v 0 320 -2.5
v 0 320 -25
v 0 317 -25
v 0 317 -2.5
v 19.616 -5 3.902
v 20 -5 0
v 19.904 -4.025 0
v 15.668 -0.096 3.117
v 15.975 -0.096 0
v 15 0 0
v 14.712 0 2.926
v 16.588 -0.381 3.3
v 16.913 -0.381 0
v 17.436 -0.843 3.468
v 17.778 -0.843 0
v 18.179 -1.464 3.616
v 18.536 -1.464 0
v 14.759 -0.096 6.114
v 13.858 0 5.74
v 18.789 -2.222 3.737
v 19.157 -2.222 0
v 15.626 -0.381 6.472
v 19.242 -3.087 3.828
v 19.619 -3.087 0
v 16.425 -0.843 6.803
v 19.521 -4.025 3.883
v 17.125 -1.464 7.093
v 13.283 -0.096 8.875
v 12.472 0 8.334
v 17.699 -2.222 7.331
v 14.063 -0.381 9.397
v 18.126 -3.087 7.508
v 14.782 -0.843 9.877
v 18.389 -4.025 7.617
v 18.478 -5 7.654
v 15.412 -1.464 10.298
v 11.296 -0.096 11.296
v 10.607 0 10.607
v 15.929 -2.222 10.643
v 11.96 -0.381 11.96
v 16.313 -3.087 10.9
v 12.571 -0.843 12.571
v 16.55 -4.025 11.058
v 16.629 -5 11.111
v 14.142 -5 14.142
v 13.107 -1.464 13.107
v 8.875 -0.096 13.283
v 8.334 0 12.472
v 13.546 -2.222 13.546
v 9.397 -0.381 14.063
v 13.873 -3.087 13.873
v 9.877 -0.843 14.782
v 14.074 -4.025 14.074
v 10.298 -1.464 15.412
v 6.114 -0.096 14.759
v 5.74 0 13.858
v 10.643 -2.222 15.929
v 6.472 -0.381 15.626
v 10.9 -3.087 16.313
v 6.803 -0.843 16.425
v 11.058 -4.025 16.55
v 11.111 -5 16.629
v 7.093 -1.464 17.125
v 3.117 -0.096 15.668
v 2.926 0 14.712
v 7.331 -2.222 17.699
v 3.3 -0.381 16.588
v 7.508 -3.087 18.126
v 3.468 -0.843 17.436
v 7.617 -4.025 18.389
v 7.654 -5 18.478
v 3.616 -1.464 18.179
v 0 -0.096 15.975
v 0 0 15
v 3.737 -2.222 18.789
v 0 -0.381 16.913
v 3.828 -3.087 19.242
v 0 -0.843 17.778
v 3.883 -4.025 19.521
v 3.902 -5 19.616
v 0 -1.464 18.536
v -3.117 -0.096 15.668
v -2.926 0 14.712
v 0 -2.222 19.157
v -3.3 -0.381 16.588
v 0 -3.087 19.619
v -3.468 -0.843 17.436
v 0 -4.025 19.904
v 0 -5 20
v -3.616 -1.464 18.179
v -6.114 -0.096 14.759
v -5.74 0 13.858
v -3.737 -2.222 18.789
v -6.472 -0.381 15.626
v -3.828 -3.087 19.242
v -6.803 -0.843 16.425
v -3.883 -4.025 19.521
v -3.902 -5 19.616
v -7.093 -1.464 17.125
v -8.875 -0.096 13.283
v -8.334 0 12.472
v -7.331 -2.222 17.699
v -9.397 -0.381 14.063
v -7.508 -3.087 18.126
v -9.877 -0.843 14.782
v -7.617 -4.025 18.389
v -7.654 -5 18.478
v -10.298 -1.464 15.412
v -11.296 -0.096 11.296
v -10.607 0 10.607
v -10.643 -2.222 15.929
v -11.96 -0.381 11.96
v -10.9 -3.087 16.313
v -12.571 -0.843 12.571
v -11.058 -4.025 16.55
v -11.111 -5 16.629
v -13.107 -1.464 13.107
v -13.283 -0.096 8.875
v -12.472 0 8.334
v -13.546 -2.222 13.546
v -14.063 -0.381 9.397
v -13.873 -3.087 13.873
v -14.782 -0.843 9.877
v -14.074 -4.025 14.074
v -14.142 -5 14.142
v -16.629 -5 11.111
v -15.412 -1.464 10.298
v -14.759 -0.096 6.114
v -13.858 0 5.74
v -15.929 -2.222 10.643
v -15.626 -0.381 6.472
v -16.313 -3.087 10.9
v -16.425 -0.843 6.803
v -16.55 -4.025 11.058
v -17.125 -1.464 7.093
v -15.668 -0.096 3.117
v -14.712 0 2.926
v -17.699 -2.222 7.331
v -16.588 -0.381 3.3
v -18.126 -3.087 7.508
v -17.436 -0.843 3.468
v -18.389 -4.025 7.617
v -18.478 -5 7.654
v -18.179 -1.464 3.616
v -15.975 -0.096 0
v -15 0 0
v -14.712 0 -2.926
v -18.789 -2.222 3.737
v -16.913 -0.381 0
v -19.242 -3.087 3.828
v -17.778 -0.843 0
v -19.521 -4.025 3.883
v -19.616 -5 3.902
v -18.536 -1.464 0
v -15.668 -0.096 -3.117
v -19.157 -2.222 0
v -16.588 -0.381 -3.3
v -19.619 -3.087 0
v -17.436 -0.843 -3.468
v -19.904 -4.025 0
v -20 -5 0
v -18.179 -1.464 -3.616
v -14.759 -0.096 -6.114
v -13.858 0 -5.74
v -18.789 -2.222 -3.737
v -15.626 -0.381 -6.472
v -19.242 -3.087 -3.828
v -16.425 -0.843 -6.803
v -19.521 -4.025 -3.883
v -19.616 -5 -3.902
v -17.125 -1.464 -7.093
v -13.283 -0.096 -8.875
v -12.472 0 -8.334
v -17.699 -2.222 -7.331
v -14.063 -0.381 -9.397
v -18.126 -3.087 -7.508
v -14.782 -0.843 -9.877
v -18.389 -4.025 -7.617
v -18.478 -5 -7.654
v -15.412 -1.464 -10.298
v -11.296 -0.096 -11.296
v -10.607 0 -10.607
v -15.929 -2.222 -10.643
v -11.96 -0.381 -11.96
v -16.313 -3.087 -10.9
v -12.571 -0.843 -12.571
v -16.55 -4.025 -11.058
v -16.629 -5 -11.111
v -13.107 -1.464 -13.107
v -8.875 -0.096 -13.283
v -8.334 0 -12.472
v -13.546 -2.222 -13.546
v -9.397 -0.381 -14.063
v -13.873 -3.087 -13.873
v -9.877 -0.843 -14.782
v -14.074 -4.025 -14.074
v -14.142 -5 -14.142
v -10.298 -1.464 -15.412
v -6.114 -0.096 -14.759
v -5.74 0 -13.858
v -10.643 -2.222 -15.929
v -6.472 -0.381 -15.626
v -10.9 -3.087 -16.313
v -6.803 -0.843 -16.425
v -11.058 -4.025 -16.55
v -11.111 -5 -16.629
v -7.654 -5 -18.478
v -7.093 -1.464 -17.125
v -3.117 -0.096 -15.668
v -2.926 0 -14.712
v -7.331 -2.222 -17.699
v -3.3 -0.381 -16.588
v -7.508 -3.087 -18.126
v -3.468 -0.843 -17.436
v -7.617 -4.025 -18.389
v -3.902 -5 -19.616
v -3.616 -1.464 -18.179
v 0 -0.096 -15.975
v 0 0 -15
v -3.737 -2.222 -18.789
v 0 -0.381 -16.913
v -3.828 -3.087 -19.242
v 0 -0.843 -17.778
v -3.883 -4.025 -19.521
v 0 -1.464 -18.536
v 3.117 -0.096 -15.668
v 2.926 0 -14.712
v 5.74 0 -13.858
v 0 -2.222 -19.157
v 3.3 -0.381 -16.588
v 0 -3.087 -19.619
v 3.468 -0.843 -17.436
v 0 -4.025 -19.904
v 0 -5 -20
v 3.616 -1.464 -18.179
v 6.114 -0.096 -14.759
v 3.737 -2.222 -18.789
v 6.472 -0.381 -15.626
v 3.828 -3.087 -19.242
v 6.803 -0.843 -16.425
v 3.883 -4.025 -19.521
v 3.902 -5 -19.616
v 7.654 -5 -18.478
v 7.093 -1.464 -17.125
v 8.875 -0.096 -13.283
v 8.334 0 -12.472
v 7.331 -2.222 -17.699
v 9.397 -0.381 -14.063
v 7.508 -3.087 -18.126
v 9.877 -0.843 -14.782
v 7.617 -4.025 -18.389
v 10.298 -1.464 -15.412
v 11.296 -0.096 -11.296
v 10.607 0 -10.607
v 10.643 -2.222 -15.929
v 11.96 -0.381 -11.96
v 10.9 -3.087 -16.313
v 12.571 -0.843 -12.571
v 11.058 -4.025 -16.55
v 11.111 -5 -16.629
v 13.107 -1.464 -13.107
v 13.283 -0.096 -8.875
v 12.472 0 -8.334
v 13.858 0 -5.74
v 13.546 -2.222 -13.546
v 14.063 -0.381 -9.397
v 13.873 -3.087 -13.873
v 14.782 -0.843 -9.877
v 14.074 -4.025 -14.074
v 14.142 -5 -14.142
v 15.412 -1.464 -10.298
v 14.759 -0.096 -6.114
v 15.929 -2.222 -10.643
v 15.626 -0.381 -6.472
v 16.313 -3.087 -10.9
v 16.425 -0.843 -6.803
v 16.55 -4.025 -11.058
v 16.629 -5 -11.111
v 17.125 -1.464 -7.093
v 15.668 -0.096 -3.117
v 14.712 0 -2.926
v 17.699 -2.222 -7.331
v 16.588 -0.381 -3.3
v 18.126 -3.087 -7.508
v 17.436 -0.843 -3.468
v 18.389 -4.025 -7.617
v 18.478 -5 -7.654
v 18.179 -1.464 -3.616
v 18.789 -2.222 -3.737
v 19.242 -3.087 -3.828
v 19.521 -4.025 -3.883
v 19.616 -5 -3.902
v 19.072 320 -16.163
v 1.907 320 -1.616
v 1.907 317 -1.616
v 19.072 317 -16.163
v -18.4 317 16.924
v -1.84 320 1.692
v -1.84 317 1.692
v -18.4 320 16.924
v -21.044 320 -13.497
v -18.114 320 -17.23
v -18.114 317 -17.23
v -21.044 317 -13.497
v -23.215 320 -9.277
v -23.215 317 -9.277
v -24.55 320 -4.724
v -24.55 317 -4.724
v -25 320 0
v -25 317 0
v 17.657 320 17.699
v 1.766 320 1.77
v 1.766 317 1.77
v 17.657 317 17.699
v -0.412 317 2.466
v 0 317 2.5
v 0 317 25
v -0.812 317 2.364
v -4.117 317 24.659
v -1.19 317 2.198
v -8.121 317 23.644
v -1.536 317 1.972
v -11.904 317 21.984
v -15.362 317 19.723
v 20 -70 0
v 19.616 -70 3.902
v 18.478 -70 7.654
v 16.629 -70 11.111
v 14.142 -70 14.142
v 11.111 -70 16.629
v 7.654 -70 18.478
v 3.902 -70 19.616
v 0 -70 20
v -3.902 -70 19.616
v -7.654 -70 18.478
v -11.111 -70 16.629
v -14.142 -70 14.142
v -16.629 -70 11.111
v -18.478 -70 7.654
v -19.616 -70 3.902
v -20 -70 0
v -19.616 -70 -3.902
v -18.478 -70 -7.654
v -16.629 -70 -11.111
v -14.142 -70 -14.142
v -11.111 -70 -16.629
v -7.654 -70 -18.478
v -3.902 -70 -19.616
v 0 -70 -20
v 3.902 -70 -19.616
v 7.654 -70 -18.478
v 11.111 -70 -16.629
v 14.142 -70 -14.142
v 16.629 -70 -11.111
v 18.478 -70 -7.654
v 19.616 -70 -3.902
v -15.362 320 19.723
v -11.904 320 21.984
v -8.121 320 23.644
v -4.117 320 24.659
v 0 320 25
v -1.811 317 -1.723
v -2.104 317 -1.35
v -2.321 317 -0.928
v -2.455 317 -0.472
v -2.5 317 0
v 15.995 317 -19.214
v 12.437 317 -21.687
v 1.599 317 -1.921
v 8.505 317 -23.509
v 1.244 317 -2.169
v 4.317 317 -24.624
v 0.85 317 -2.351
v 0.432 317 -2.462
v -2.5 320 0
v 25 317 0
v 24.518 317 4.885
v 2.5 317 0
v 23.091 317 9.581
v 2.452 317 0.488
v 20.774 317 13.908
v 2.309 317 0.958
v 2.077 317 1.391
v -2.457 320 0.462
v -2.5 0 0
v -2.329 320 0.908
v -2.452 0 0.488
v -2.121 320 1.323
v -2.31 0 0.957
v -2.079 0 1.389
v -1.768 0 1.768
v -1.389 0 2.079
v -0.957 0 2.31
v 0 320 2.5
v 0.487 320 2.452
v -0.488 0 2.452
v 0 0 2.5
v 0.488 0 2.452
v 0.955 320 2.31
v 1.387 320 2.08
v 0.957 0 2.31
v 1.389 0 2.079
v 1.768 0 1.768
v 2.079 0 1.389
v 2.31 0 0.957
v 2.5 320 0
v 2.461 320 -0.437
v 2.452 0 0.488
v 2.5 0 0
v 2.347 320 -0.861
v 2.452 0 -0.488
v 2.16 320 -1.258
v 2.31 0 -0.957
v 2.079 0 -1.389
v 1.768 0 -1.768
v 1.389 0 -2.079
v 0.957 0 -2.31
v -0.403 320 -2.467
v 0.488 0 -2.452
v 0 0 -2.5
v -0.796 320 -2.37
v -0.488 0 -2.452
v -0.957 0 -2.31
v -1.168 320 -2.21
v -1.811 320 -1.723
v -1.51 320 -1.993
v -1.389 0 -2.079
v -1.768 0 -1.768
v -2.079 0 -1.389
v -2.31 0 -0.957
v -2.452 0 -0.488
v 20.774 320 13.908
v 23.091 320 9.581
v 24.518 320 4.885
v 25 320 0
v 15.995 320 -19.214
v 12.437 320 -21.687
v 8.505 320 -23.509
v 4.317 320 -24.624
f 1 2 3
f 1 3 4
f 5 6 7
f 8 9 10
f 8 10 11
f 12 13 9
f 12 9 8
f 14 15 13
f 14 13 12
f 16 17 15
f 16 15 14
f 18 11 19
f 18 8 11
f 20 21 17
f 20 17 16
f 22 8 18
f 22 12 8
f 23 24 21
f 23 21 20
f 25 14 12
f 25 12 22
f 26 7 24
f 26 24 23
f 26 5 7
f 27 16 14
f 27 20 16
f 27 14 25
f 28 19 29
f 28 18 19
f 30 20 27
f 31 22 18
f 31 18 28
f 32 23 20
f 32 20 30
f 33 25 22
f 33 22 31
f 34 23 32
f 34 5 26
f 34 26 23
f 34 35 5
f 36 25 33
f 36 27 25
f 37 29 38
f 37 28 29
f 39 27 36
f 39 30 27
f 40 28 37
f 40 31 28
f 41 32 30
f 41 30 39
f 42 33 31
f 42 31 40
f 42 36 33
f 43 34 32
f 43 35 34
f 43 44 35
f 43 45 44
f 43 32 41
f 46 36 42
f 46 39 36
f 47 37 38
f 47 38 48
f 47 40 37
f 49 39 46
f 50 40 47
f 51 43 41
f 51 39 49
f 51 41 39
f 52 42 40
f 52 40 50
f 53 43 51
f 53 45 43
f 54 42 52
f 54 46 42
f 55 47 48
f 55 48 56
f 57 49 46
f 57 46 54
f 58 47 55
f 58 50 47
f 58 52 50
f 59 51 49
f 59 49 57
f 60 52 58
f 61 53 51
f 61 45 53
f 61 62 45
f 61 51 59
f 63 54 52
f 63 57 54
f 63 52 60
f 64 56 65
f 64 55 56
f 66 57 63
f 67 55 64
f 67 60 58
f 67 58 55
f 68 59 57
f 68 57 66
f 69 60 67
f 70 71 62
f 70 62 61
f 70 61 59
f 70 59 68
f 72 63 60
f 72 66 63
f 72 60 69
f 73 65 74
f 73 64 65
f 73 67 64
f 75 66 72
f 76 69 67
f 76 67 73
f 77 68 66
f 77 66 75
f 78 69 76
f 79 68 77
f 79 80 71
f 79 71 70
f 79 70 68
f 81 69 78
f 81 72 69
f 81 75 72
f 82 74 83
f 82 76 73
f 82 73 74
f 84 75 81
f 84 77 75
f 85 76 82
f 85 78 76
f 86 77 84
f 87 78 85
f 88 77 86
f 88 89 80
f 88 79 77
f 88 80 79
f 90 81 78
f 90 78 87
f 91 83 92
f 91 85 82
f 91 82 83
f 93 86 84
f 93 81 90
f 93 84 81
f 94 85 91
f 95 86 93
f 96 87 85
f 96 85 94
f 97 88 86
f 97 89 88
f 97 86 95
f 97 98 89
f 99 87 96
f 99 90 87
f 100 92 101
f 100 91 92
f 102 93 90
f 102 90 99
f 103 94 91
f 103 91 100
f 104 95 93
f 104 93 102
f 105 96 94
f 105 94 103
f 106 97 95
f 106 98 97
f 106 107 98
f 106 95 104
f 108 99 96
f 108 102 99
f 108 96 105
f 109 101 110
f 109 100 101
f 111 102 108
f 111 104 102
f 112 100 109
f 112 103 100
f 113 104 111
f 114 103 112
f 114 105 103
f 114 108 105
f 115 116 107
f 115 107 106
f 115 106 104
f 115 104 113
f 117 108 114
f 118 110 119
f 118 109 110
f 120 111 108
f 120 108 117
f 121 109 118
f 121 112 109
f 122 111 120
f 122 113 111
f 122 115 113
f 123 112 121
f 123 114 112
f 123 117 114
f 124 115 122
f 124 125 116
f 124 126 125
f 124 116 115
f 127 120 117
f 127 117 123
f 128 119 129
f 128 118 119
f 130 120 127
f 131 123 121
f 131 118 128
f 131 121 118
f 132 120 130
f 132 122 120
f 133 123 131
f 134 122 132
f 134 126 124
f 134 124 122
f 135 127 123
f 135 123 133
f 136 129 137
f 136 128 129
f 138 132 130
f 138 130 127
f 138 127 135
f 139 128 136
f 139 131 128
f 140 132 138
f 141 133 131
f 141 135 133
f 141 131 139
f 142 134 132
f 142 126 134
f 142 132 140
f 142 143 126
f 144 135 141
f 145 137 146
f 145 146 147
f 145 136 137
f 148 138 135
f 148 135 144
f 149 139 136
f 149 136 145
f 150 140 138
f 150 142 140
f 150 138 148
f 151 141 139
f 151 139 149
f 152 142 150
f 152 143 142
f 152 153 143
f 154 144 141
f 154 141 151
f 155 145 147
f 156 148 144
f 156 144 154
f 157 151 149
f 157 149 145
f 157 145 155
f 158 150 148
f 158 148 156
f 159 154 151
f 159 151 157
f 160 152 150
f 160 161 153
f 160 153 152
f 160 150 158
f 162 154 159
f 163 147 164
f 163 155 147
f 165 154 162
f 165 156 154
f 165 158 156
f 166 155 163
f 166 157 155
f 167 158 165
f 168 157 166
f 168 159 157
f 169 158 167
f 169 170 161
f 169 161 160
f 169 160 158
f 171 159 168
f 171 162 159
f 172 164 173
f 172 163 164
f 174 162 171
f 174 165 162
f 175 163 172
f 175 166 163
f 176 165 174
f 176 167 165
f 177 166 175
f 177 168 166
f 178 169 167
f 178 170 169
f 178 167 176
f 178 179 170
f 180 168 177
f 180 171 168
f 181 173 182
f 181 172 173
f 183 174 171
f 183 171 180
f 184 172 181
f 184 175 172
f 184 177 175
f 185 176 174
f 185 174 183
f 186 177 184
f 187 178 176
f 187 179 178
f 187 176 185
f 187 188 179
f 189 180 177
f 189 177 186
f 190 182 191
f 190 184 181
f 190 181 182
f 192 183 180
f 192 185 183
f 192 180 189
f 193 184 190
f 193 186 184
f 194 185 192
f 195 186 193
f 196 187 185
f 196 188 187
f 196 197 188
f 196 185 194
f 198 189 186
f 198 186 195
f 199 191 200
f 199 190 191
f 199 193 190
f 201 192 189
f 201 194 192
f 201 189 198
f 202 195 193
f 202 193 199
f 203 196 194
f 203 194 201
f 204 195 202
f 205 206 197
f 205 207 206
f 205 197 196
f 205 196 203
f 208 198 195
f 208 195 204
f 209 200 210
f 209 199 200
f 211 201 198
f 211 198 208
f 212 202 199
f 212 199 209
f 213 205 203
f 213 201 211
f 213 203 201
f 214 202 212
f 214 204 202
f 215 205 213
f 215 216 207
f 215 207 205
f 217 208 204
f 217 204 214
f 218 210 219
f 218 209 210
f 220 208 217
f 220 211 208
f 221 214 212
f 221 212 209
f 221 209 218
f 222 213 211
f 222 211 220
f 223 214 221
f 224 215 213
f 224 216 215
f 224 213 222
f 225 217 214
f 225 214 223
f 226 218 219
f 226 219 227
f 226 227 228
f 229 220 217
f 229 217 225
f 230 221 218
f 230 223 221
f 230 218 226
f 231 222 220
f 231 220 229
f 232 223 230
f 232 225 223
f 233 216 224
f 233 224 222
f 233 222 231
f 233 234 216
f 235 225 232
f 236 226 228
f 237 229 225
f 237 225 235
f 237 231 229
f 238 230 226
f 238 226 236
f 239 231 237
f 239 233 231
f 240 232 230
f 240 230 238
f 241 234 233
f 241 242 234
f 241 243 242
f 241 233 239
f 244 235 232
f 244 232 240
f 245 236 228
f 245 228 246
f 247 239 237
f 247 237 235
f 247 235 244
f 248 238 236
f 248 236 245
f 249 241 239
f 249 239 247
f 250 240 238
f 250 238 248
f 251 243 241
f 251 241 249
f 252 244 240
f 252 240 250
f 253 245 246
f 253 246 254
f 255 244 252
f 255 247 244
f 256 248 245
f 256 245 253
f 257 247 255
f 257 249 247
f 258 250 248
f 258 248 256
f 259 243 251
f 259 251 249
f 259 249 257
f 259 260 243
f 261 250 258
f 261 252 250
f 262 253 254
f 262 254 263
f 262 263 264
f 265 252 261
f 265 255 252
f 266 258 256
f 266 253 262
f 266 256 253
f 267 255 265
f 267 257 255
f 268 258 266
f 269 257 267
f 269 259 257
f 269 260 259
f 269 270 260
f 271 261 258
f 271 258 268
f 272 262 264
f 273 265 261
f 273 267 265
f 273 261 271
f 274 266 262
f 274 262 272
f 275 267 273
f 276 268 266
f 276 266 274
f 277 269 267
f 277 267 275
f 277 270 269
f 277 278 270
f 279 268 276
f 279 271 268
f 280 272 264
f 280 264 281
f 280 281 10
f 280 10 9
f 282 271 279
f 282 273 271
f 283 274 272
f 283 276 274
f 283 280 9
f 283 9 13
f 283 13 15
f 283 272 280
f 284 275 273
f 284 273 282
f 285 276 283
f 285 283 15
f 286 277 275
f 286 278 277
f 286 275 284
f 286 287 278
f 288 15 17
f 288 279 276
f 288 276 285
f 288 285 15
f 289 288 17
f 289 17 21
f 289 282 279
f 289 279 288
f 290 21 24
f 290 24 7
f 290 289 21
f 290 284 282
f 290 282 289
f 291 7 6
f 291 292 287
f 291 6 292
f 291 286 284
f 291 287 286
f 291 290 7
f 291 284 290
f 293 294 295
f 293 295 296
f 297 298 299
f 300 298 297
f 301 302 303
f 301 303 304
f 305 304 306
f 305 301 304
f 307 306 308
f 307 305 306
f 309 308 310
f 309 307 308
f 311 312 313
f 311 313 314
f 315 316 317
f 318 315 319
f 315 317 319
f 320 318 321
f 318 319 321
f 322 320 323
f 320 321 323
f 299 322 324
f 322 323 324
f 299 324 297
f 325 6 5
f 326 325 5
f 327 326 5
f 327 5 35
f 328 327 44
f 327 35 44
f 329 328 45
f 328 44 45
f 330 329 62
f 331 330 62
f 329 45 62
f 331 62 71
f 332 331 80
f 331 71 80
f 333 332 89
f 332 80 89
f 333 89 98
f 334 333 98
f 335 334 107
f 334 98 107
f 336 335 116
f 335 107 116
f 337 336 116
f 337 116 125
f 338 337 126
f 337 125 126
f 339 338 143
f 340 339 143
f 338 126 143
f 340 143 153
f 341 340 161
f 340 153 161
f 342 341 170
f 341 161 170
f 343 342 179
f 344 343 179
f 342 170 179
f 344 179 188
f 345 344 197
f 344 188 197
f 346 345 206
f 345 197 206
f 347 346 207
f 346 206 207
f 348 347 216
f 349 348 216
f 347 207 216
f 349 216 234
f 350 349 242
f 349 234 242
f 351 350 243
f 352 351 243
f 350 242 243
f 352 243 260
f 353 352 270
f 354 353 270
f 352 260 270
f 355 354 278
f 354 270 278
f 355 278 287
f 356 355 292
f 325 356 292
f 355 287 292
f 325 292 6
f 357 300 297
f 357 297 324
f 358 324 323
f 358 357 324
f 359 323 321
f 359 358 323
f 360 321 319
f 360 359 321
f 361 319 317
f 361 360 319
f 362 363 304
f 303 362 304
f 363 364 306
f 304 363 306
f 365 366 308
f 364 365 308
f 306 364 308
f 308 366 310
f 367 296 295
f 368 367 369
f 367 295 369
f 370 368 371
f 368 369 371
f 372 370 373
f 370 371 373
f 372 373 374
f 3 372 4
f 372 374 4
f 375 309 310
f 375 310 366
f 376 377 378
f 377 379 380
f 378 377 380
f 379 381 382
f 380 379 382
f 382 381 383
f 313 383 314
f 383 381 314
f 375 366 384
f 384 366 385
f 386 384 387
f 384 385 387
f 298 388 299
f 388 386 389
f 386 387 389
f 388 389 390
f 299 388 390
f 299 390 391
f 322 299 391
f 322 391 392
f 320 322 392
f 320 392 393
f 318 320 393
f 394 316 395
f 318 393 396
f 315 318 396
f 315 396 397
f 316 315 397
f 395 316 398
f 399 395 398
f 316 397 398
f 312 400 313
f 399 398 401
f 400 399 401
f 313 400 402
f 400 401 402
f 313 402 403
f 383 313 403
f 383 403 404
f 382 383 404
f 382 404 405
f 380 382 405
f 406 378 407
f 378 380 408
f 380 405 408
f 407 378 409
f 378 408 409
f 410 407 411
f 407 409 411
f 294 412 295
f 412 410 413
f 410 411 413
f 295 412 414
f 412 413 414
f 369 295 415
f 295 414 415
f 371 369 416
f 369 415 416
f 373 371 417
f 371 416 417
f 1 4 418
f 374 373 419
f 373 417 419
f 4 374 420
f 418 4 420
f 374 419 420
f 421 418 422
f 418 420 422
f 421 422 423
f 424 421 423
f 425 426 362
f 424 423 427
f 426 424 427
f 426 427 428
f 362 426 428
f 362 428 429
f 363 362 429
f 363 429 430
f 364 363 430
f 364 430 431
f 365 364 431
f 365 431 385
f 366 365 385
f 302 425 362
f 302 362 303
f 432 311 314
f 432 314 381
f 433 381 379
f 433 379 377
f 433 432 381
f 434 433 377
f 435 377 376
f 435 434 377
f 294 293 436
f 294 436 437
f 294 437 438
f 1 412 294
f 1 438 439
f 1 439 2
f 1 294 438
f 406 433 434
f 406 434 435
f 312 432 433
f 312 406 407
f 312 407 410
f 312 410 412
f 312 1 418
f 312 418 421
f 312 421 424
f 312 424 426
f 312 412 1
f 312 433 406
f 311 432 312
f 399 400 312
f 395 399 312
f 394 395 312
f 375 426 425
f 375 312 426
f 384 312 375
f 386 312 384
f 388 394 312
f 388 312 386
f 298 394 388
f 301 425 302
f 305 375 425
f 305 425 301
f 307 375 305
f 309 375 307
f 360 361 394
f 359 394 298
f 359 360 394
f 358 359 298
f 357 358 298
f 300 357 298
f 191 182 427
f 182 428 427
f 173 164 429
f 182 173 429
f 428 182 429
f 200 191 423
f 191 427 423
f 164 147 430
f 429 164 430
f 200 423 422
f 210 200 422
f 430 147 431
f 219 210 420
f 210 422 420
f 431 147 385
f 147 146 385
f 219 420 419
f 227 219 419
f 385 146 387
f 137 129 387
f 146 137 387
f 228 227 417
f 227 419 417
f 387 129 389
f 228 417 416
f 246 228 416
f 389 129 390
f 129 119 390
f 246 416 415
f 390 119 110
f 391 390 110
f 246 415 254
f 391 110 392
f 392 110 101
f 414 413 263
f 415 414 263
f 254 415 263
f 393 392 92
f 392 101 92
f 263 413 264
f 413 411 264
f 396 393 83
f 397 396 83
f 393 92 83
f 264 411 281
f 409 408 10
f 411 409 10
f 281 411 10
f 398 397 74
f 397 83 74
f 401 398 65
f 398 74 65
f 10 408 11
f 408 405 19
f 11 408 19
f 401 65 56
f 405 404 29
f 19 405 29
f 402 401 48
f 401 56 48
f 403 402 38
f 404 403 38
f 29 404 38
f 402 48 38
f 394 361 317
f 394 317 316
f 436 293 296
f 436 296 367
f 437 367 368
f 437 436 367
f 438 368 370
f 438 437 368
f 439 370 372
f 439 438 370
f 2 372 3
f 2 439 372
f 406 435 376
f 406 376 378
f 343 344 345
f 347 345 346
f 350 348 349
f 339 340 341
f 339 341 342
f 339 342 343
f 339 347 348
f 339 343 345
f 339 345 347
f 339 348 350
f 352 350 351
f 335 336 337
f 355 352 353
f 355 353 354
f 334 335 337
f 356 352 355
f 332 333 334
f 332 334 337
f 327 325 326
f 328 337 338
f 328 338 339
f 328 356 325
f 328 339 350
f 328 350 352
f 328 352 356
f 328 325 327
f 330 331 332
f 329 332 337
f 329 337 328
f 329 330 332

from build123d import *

# Parameters (mm, degrees)
F0_R     = 20
F1_DEPTH = 70
F2_R     = 2.5
F3_DEPTH = 320
F5_DEPTH = 3
F6_R     = 5


with BuildPart() as f1:
    # F0 (on Front) → F1 (new body)
    with BuildSketch(Plane.XZ):
        Circle(F0_R)
    extrude(amount=F1_DEPTH)

    # F2 (on face) → F3 (join)
    with BuildSketch(Plane(origin=(0, 0, 0), x_dir=(-1, 0, 0), z_dir=(0, 1, 0))):
        Circle(F2_R)
    extrude(amount=F3_DEPTH)

    # F4 (on face) → F5 (join)
    with BuildSketch(Plane(origin=(0, 320, 0), x_dir=(-1, 0, 0), z_dir=(0, 1, 0))):
        with BuildLine():
            Line((1.8400168651, 1.6924355043), (18.4001686511, 16.9243550427))
            ThreePointArc((18.4001686511, 16.9243550427), (10.0471668626, 22.8922353219), (0, 25))
            Line((0, 25), (0, 2.5))
            ThreePointArc((0, 2.5), (1.0047166863, 2.2892235322), (1.8400168651, 1.6924355043))
        make_face()
        with BuildLine():
            ThreePointArc((18.1144622727, -17.2298072122), (23.2148826921, -9.2773499229), (25, 0))
            Line((25, 0), (2.5, 0))
            ThreePointArc((2.5, 0), (2.3214882692, -0.9277349923), (1.8114462273, -1.7229807212))
            Line((1.8114462273, -1.7229807212), (18.1144622727, -17.2298072122))
        make_face()
        with BuildLine():
            ThreePointArc((-19.0723992016, -16.163031544), (-10.5100954182, -22.6834277458), (0, -25))
            Line((0, -25), (0, -2.5))
            ThreePointArc((0, -2.5), (-1.0510095418, -2.2683427746), (-1.9072399202, -1.6163031544))
            Line((-1.9072399202, -1.6163031544), (-19.0723992016, -16.163031544))
        make_face()
        with BuildLine():
            Line((-1.765668367, 1.7698630505), (-17.6566836704, 17.6986305053))
            ThreePointArc((-17.6566836704, 17.6986305053), (-23.0913088819, 9.5807856734), (-25, 0))
            Line((-25, 0), (-2.5, 0))
            ThreePointArc((-2.5, 0), (-2.3091308882, 0.9580785673), (-1.765668367, 1.7698630505))
        make_face()
    extrude(amount=-F5_DEPTH)

    # F6
    f6_edges = [f1.edges().sort_by_distance(p)[0] for p in [
        (-20, 0, 0),
    ]]
    fillet(f6_edges, radius=F6_R)


solid = f1.part
